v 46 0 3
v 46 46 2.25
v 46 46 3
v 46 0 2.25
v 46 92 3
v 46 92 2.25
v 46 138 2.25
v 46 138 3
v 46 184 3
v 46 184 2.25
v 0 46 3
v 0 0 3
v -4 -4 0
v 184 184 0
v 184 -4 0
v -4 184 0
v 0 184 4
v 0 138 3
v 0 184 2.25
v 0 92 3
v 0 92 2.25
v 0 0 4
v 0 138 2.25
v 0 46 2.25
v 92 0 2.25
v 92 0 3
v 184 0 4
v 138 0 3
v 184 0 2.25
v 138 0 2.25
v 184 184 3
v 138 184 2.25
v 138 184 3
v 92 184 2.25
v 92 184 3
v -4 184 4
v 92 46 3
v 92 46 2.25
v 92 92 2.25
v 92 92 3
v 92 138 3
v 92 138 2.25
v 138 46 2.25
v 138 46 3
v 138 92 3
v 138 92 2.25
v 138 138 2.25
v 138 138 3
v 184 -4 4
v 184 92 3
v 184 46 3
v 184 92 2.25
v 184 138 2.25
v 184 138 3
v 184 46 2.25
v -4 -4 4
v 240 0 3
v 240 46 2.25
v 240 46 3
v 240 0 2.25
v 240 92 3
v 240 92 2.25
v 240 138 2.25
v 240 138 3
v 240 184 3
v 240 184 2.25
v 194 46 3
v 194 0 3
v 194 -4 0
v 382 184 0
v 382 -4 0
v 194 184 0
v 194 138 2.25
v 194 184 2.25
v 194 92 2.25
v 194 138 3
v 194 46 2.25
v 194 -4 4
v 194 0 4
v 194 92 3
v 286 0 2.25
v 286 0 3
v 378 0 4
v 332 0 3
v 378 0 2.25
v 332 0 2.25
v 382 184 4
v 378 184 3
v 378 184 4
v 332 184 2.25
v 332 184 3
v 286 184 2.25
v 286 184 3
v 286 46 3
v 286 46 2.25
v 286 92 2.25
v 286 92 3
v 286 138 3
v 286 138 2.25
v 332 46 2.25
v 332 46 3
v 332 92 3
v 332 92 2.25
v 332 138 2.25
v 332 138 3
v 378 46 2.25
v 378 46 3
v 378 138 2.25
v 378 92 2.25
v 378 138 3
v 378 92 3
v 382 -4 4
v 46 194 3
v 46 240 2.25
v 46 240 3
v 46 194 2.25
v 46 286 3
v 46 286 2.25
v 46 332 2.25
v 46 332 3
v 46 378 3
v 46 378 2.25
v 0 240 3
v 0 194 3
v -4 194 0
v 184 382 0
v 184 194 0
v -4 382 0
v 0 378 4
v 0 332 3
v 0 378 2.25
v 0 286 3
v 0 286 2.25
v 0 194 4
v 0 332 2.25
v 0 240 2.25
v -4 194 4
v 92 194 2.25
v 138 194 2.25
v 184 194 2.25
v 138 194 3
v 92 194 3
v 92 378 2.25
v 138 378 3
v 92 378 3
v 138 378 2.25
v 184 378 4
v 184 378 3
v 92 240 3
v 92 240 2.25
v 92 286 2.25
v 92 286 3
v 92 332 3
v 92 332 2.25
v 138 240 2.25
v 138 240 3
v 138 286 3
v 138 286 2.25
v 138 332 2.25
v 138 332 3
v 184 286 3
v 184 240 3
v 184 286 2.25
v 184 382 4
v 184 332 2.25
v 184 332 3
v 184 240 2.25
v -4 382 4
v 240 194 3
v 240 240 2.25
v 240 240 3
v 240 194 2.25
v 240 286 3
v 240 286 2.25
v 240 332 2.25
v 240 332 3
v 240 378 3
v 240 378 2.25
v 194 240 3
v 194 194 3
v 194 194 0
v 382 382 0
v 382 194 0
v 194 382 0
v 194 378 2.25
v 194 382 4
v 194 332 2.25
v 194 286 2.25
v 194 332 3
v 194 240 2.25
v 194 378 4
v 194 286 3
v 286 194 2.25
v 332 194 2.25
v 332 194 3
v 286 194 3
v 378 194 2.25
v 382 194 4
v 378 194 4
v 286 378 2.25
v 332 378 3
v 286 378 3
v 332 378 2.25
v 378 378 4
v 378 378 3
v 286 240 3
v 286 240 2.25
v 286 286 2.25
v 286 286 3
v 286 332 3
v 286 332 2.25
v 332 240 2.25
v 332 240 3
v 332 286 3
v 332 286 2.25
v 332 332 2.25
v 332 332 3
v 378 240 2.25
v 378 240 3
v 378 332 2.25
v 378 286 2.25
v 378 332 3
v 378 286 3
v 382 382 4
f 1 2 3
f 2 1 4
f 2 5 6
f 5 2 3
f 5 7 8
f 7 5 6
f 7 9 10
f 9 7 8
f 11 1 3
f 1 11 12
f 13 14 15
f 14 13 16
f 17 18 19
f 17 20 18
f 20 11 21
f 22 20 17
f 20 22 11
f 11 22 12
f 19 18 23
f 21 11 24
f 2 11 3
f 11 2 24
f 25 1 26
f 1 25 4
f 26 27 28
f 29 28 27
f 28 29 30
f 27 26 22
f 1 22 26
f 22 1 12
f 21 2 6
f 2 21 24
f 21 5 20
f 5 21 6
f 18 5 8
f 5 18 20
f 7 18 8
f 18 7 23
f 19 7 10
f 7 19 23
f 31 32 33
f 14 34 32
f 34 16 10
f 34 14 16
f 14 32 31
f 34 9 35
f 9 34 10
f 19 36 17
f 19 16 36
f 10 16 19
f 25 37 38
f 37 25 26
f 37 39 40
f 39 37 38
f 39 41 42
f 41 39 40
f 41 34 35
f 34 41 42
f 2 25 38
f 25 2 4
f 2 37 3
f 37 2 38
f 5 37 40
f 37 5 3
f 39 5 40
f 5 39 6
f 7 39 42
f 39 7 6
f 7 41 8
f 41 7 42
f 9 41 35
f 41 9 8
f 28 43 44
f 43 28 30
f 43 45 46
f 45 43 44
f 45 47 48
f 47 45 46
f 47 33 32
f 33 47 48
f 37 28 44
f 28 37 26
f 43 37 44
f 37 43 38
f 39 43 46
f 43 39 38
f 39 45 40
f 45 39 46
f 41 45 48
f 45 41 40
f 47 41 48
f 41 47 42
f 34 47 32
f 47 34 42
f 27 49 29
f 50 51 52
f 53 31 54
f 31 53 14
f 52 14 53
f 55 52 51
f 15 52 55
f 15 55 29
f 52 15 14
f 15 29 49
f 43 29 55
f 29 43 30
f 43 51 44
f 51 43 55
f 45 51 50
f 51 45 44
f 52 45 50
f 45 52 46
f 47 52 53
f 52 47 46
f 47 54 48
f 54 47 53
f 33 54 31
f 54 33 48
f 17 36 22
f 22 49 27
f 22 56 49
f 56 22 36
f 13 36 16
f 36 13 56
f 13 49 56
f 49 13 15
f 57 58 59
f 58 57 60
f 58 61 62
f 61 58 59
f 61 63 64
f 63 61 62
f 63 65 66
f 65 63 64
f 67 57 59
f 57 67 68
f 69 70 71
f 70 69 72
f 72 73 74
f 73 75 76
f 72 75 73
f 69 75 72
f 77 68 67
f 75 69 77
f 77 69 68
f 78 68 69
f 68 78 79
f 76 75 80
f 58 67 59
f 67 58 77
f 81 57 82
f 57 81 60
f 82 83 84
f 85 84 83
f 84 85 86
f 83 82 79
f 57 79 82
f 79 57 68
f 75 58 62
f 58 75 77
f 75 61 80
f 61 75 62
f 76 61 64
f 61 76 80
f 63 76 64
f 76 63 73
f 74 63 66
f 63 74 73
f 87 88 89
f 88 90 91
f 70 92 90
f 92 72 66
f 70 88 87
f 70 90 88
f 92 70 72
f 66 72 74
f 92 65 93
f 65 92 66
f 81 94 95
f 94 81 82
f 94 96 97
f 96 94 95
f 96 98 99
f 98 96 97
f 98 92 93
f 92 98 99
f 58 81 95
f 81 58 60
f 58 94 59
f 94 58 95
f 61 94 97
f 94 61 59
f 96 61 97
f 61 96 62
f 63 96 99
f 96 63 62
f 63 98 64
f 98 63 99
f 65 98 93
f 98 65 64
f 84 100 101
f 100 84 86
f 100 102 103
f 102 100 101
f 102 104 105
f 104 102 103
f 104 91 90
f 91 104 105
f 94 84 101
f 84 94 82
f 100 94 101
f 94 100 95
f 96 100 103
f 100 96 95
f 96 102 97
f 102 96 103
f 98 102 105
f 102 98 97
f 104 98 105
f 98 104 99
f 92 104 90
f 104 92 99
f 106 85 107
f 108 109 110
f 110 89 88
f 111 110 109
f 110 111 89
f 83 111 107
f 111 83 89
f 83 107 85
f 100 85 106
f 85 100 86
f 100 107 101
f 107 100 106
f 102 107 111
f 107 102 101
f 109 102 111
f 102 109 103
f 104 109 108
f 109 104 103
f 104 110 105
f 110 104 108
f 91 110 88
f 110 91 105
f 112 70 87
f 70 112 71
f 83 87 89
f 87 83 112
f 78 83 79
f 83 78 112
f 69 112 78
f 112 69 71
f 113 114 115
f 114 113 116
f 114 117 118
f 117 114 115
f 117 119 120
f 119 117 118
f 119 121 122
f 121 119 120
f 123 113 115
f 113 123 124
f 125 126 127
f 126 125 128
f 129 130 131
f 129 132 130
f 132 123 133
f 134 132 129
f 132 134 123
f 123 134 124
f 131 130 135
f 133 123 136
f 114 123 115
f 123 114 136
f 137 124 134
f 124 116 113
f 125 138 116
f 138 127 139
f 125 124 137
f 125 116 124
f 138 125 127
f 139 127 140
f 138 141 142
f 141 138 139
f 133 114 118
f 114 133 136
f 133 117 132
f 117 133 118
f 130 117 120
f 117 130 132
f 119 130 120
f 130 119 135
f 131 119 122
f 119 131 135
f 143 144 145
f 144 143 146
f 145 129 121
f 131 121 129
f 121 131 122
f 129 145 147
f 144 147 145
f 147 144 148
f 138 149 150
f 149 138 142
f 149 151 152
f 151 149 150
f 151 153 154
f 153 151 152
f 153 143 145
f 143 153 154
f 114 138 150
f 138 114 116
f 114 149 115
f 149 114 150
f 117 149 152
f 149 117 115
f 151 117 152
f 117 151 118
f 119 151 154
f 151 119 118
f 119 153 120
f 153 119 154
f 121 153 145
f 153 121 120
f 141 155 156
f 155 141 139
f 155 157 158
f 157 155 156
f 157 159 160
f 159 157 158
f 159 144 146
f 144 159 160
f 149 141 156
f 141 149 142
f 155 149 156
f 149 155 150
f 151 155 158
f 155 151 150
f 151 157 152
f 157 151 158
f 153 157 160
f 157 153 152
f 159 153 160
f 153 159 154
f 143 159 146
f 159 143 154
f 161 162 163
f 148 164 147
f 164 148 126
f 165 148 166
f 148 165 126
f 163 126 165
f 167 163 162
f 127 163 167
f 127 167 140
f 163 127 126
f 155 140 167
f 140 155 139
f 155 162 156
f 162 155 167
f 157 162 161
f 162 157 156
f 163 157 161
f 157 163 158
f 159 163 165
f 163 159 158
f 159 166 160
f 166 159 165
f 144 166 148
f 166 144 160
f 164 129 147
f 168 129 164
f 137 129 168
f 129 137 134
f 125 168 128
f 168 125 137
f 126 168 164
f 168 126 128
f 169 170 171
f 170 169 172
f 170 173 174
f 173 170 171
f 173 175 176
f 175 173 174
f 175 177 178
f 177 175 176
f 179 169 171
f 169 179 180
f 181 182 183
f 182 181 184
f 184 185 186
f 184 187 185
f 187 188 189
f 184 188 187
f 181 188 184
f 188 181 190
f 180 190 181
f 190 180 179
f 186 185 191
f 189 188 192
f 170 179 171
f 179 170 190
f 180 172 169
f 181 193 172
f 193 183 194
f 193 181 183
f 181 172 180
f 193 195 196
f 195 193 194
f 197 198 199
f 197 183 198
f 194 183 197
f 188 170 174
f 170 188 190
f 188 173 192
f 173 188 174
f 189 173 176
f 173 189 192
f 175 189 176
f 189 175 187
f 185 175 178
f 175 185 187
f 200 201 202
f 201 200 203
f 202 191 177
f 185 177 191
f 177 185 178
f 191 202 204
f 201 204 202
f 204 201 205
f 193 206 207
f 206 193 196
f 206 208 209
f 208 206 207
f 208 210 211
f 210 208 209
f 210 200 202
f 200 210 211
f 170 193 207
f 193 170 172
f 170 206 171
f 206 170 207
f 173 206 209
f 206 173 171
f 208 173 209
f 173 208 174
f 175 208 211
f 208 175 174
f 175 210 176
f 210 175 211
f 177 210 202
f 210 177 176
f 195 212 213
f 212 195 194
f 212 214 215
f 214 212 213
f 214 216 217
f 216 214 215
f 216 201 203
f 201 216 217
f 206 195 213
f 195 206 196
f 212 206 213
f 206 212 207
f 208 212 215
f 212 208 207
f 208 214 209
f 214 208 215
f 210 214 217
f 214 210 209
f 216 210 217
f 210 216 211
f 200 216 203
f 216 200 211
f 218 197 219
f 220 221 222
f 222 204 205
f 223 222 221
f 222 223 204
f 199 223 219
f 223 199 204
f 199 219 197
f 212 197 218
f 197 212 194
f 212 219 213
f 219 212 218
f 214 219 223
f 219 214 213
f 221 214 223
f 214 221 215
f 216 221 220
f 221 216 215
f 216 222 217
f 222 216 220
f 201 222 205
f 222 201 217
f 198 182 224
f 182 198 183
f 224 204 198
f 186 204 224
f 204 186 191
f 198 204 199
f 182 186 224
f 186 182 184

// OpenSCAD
// file: build.scad
$build_id = "";

function building(filename) = is_undef(filename) ?
  !is_undef(build)
  : !is_undef(build) && build == filename;

function previewing() = !building();

module build(filename) {
  $build_id = filename;

  if(!is_undef(scad_build_scan) && scad_build_scan == true) {
    echo(str("scad_build_scan: ", filename));
  }
  else if(previewing() || build == filename) {
    children();
  }
}

module preview_row(spacing) {
  if(previewing()) {
    for(x = [0:1:$children - 1]) {
      translate([x * spacing, 0, 0]) {
        children(x);
      }
    }
  }
  else {
    children();
  }
}

module preview_column(spacing) {
  if(previewing()) {
    for(y = [0:1:$children - 1]) {
      translate([0, y * spacing, 0]) {
        children(y);
      }
    }
  }
  else {
    children();
  }
}
// main file
include <./build.scad>

square_size = 46;
board_height = 4;
board_border = 4;


module black_square() {
  color("black") {
    cube([square_size, square_size, board_height - 1]);
  }
}

module white_square() {
  color("white") {
    cube([square_size, square_size, board_height - 1.75]);
  }
}

module checkerboard(rows, columns) {
  $rows = rows;
  $columns = columns;

  for(x = [0:1:rows - 1]) {
    for(y = [0:1:columns - 1]) {
      translate([square_size * x, square_size * y, 0]) {
        if ((x + y) % 2 == 0) {
          black_square();
        }
        else {
          white_square();
        }
      }
    }
  }

  children();
}

module top() {
  translate([0, square_size * $columns, 0]) {
    children();
  }
}

module bottom() {
  translate([0, -board_border, 0]) {
    children();
  }
}

module left() {
  translate([-board_border, 0, 0]) {
    children();
  }
}

module right() {
  translate([square_size * $columns, 0, 0]) {
    children();
  }
}

module border_v() {
  color("gray") {
    cube([square_size * $columns + board_border, board_border, board_height]);
  }
}

module border_h() {
  color("gray") {
    cube([board_border, square_size * $columns, board_height]);
  }
}

module top_border() {
  color("gray") {
    translate([0, square_size * $columns, 0]) {
      cube([square_size * $columns, board_border, board_height]);
    }
  }
}

module bottom_border() {
  color("gray") {
    translate([0, -board_border, 0]) {
      cube([square_size * $columns, board_border, board_height]);
    }
  }
}

module left_border() {
  color("gray") {
    translate([-board_border, 0, 0]) {
      cube([board_border, square_size * $columns, board_height]);
    }
  }
}

module right_border() {
  color("gray") {
    translate([square_size * $columns, 0, 0]) {
      cube([board_border, square_size * $columns, board_height]);
    }
  }
}

preview_column(square_size * 4 + 10) {
  preview_row(square_size * 4 + 10) {
    build("bottom-left") checkerboard(4, 4) {
      bottom() left() border_v();
      left() border_h();
    }

    build("bottom-right") checkerboard(4, 4) {
      bottom() border_v();
      right() border_h();
    }
  }
  preview_row(square_size * 4 + 10) {
    build("top-left") checkerboard(4, 4) {
      top() left() border_v();
      left() border_h();
    }

    build("top-right") checkerboard(4, 4) {
      top() border_v();
      right() border_h();
    }
  }
}
